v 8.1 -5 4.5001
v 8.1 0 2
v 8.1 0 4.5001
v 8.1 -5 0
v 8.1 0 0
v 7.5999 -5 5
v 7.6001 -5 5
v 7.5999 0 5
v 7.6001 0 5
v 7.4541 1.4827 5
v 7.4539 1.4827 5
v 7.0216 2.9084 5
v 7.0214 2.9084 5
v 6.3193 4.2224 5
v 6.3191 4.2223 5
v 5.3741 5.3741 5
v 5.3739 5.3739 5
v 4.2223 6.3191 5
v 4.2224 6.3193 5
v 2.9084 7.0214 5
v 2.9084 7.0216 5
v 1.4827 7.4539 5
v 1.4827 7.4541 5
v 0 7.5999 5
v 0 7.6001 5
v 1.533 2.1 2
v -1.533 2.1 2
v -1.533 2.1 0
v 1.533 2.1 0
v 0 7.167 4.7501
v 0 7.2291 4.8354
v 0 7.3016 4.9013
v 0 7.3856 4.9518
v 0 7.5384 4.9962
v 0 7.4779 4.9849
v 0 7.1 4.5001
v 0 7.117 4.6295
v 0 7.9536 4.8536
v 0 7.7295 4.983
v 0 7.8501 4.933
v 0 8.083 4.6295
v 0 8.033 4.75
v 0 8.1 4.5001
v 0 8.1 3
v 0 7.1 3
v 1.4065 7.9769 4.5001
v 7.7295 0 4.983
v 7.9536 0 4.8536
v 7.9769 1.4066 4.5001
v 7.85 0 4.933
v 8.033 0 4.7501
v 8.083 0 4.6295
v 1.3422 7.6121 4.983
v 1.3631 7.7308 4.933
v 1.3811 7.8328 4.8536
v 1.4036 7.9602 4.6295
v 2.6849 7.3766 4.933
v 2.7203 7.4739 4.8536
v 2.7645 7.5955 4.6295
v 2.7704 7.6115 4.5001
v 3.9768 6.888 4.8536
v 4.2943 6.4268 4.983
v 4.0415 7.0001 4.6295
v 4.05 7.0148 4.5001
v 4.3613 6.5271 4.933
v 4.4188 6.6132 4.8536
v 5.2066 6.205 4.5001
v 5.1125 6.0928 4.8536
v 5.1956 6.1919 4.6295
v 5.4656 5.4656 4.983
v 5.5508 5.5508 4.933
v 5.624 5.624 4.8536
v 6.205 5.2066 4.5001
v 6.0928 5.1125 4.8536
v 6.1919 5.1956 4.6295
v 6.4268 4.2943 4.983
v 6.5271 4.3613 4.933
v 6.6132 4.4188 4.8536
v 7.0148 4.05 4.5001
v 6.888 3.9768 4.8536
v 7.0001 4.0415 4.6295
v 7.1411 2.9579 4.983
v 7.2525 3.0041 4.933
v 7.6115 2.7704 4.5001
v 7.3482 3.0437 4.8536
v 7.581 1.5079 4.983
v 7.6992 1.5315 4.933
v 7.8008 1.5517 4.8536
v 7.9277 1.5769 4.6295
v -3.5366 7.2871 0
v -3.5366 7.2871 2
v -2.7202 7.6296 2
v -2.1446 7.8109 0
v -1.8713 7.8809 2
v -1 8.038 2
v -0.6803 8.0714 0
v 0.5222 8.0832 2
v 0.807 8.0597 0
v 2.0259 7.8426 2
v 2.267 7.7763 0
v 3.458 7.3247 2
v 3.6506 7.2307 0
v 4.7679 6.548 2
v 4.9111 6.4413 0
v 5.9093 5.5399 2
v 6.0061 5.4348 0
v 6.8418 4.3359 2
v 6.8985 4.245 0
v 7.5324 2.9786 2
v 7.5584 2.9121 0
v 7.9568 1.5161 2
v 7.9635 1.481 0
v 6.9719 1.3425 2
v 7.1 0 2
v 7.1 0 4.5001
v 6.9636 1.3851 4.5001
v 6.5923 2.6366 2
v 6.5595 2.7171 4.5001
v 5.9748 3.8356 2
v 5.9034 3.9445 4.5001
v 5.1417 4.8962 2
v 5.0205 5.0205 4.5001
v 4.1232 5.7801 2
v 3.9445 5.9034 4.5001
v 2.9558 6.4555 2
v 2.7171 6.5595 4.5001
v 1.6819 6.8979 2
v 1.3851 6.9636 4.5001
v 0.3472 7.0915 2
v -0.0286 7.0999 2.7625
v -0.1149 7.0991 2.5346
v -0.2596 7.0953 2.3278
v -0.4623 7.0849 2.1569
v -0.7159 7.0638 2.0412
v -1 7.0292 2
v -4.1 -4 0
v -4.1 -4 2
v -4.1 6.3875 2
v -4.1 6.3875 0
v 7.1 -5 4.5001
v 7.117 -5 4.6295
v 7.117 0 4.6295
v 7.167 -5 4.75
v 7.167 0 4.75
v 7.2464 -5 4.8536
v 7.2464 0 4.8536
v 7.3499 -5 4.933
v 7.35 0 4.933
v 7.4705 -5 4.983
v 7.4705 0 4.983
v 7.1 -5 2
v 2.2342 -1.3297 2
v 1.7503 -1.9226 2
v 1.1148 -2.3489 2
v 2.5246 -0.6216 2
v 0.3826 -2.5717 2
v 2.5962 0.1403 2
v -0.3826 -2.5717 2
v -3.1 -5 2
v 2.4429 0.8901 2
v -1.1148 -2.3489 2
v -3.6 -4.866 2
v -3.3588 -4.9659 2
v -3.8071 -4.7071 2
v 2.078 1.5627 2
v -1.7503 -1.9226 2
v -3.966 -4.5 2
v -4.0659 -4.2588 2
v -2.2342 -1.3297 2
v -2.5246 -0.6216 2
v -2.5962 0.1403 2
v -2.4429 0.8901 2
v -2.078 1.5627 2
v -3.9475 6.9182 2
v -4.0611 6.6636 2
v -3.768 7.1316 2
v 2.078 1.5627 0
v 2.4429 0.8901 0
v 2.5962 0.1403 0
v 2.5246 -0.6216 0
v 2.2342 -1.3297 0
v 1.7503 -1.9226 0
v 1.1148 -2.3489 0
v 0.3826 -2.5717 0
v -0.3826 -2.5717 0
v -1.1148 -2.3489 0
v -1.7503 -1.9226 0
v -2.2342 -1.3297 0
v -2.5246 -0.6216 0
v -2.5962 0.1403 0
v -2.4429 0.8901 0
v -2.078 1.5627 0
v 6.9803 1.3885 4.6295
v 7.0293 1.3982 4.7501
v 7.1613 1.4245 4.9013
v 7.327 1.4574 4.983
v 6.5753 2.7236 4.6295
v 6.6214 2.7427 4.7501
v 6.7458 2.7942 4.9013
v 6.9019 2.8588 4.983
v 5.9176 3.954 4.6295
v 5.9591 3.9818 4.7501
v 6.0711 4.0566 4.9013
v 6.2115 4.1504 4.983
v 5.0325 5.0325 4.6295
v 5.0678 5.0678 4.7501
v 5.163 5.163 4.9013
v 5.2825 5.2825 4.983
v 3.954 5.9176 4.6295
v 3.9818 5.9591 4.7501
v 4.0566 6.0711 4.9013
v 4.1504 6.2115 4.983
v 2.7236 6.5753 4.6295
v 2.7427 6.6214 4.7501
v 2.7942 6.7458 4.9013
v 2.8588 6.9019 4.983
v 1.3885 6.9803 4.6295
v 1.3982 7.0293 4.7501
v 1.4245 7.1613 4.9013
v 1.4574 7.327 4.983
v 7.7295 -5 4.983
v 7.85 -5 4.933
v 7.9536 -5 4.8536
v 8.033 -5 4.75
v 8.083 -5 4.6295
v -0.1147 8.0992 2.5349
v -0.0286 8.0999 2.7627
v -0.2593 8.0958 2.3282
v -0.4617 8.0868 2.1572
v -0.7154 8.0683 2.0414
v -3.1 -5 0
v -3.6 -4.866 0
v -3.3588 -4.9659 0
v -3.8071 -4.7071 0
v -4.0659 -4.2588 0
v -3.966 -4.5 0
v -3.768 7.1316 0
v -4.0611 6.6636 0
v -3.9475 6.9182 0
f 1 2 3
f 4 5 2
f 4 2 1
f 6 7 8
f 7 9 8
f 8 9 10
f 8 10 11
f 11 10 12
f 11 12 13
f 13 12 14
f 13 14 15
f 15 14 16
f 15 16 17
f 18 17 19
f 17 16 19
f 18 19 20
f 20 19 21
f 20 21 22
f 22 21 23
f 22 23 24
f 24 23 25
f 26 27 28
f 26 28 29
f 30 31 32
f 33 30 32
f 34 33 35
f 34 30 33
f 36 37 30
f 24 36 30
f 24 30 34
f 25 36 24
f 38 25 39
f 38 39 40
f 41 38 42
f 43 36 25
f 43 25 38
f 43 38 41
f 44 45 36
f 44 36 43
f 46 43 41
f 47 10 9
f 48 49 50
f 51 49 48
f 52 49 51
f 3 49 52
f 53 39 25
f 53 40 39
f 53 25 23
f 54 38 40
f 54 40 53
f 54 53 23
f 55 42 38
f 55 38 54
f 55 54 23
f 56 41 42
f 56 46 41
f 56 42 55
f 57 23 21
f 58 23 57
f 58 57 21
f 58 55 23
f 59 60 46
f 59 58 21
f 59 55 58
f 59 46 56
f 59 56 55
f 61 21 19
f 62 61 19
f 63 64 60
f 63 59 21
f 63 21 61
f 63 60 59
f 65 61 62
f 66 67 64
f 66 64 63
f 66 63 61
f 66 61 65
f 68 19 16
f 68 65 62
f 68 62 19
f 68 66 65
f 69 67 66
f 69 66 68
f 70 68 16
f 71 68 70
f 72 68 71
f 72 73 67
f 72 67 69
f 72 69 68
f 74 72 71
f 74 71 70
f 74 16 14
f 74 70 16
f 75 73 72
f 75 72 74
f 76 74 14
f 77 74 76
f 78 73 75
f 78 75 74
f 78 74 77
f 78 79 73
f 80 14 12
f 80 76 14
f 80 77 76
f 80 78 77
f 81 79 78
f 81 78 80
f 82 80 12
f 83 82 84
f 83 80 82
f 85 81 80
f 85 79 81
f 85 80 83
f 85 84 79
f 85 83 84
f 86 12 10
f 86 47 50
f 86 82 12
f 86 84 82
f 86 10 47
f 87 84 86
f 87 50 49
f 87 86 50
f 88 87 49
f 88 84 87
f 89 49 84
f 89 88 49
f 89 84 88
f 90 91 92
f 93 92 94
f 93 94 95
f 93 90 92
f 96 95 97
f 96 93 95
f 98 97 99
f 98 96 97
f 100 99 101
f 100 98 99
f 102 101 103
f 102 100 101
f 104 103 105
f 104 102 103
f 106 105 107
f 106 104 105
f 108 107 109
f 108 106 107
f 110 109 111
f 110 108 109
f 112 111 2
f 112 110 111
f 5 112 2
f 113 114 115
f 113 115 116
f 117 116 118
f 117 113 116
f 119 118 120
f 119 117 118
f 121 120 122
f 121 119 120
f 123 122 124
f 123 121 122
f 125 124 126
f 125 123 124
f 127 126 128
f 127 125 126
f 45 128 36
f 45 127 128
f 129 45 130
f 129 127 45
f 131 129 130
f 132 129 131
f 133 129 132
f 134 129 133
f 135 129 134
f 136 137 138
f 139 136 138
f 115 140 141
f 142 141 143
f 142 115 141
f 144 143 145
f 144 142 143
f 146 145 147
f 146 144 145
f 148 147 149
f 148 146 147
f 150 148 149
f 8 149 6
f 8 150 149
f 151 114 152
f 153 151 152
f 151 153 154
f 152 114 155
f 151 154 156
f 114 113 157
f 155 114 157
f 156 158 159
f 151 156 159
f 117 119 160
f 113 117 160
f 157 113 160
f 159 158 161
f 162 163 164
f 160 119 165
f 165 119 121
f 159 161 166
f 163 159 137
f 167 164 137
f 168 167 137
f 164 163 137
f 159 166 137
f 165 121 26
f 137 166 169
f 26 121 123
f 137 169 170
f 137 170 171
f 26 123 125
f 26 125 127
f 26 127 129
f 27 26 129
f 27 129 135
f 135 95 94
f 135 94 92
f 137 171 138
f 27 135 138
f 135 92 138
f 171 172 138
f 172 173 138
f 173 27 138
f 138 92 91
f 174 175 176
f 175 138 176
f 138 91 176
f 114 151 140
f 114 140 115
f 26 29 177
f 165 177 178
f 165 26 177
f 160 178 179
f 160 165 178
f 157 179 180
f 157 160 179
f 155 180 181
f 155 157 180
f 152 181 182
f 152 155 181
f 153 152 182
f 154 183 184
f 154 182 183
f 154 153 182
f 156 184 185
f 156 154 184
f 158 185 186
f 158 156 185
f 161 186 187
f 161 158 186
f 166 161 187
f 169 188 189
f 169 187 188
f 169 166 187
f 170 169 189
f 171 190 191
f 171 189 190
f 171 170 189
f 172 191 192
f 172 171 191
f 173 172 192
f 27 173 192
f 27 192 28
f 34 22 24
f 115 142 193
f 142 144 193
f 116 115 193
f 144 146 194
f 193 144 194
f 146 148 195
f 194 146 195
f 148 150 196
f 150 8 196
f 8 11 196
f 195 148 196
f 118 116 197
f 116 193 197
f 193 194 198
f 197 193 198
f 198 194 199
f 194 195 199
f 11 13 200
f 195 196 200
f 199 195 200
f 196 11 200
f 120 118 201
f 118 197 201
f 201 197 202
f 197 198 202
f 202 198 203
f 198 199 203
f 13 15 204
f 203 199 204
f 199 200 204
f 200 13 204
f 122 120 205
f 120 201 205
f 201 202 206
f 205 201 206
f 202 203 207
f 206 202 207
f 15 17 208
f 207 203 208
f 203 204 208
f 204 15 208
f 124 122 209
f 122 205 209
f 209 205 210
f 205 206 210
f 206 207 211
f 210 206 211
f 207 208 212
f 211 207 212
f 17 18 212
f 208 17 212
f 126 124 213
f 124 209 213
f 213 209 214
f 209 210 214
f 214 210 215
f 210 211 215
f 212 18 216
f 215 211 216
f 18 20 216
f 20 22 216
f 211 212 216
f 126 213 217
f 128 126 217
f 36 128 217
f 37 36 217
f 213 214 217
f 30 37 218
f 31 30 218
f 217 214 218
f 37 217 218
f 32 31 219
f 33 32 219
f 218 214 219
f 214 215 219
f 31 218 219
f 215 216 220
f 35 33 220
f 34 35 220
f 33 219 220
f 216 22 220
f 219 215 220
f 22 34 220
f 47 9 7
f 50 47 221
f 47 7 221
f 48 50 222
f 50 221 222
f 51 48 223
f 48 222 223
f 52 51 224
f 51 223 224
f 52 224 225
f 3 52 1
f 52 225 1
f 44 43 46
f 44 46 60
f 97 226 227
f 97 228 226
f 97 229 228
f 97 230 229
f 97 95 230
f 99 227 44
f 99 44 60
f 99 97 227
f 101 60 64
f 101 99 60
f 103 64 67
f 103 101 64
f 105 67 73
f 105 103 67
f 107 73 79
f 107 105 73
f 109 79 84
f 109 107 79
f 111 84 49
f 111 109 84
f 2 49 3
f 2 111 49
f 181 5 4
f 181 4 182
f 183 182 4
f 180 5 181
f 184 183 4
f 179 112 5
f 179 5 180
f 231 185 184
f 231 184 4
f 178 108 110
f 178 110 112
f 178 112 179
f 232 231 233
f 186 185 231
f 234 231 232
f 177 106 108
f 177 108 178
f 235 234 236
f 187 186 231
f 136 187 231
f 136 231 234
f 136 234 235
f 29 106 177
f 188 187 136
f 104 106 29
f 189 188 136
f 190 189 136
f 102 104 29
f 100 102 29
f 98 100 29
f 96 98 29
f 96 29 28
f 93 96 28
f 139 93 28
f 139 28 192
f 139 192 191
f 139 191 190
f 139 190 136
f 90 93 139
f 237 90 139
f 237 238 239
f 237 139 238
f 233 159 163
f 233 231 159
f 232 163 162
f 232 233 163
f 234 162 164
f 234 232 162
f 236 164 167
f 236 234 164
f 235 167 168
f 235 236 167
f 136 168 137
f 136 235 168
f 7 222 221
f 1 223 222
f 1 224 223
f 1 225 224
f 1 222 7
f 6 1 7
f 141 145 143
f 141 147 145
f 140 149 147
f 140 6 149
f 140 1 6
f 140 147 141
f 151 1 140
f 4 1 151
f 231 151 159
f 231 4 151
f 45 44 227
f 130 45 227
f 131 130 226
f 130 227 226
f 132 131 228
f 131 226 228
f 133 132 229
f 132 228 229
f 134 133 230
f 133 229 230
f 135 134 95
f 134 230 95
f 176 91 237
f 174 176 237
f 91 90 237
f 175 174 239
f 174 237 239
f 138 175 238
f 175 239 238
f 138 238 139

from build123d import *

# Parameters (mm, degrees)
SALIENTE_EXTRUIR1_DEPTH = 2
CORTAR_EXTRUIR1_REACH   = 13.628
CORTAR_EXTRUIR2_REACH   = 13.628
SALIENTE_EXTRUIR3_DEPTH = 3
REDONDEO3_R             = 0.5
REDONDEO4_R             = 1


with BuildPart() as part:
    # Croquis1 → Saliente-Extruir1 (new body)
    with BuildSketch(Plane.XY):
        with BuildLine():
            Line((8.1, 0), (8.1, -5))
            Line((8.1, -5), (-8.1, -5))
            Line((-8.1, -5), (-8.1, 0))
            ThreePointArc((-8.1, 0), (0, 8.1), (8.1, 0))
        make_face()
    extrude(amount=SALIENTE_EXTRUIR1_DEPTH)

    # Croquis4 → Cortar-Extruir1 (cut, up to next)
    with BuildSketch(Plane.XY.offset(2), mode=Mode.PRIVATE) as cortar_extruir1_sk1:
        with BuildLine():
            Line((-1.532970972, 2.1), (1.532970972, 2.1))
            ThreePointArc((1.532970972, 2.1), (0, -2.6), (-1.532970972, 2.1))
        make_face()
    cortar_extruir1_tool1 = extrude(cortar_extruir1_sk1.sketch, amount=-CORTAR_EXTRUIR1_REACH, mode=Mode.PRIVATE) & part.part
    add(cortar_extruir1_tool1.solids().sort_by_distance((0, -0.118931, 2))[0], mode=Mode.SUBTRACT)

    # Croquis5 → Cortar-Extruir2 (cut, up to next)
    with BuildSketch(Plane.XY.offset(2), mode=Mode.PRIVATE) as cortar_extruir2_sk1:
        with BuildLine():
            Line((-4.1, -5), (-4.1, 6.985699679))
            ThreePointArc((-4.1, 6.985699679), (-7.029224708, 4.024922359), (-8.1, 0))
            Line((-8.1, 0), (-8.1, -5))
            Line((-8.1, -5), (-4.1, -5))
        make_face()
    cortar_extruir2_tool1 = extrude(cortar_extruir2_sk1.sketch, amount=-CORTAR_EXTRUIR2_REACH, mode=Mode.PRIVATE) & part.part
    add(cortar_extruir2_tool1.solids().sort_by_distance((-5.920703, 0.103857, 2))[0], mode=Mode.SUBTRACT)

    # Croquis7 → Saliente-Extruir3 (add)
    with BuildSketch(Plane.XY.offset(2)):
        with BuildLine():
            Line((8.1, 0), (8.1, -5))
            Line((8.1, -5), (7.1, -5))
            Line((7.1, -5), (7.1, 0))
            ThreePointArc((7.1, 0), (5.020457997, 5.020458296), (-4.23e-07, 7.1))
            Line((-4.23e-07, 7.1), (-4.23e-07, 8.1))
            ThreePointArc((-4.23e-07, 8.1), (5.727564778, 5.727565077), (8.1, 0))
        make_face()
    extrude(amount=SALIENTE_EXTRUIR3_DEPTH)

    # Redondeo3
    redondeo3_edges = [part.edges().sort_by_distance(p)[0] for p in [
        (5.727564778, 5.727565077, 5),
        (5.020457997, 5.020458296, 5),
        (7.1, -2.5, 5),
        (8.1, -2.5, 5),
    ]]
    fillet(redondeo3_edges, radius=REDONDEO3_R - 0.0001)  # a hair under: the kernel refuses the full size

    # Redondeo4
    redondeo4_edges = [part.edges().sort_by_distance(p)[0] for p in [
        (-4.1, -5, 1),
        (-4.1, 6.985699679, 1),
        (-4.23e-07, 7.6, 2),
    ]]
    fillet(redondeo4_edges, radius=REDONDEO4_R)


solid = part.part
